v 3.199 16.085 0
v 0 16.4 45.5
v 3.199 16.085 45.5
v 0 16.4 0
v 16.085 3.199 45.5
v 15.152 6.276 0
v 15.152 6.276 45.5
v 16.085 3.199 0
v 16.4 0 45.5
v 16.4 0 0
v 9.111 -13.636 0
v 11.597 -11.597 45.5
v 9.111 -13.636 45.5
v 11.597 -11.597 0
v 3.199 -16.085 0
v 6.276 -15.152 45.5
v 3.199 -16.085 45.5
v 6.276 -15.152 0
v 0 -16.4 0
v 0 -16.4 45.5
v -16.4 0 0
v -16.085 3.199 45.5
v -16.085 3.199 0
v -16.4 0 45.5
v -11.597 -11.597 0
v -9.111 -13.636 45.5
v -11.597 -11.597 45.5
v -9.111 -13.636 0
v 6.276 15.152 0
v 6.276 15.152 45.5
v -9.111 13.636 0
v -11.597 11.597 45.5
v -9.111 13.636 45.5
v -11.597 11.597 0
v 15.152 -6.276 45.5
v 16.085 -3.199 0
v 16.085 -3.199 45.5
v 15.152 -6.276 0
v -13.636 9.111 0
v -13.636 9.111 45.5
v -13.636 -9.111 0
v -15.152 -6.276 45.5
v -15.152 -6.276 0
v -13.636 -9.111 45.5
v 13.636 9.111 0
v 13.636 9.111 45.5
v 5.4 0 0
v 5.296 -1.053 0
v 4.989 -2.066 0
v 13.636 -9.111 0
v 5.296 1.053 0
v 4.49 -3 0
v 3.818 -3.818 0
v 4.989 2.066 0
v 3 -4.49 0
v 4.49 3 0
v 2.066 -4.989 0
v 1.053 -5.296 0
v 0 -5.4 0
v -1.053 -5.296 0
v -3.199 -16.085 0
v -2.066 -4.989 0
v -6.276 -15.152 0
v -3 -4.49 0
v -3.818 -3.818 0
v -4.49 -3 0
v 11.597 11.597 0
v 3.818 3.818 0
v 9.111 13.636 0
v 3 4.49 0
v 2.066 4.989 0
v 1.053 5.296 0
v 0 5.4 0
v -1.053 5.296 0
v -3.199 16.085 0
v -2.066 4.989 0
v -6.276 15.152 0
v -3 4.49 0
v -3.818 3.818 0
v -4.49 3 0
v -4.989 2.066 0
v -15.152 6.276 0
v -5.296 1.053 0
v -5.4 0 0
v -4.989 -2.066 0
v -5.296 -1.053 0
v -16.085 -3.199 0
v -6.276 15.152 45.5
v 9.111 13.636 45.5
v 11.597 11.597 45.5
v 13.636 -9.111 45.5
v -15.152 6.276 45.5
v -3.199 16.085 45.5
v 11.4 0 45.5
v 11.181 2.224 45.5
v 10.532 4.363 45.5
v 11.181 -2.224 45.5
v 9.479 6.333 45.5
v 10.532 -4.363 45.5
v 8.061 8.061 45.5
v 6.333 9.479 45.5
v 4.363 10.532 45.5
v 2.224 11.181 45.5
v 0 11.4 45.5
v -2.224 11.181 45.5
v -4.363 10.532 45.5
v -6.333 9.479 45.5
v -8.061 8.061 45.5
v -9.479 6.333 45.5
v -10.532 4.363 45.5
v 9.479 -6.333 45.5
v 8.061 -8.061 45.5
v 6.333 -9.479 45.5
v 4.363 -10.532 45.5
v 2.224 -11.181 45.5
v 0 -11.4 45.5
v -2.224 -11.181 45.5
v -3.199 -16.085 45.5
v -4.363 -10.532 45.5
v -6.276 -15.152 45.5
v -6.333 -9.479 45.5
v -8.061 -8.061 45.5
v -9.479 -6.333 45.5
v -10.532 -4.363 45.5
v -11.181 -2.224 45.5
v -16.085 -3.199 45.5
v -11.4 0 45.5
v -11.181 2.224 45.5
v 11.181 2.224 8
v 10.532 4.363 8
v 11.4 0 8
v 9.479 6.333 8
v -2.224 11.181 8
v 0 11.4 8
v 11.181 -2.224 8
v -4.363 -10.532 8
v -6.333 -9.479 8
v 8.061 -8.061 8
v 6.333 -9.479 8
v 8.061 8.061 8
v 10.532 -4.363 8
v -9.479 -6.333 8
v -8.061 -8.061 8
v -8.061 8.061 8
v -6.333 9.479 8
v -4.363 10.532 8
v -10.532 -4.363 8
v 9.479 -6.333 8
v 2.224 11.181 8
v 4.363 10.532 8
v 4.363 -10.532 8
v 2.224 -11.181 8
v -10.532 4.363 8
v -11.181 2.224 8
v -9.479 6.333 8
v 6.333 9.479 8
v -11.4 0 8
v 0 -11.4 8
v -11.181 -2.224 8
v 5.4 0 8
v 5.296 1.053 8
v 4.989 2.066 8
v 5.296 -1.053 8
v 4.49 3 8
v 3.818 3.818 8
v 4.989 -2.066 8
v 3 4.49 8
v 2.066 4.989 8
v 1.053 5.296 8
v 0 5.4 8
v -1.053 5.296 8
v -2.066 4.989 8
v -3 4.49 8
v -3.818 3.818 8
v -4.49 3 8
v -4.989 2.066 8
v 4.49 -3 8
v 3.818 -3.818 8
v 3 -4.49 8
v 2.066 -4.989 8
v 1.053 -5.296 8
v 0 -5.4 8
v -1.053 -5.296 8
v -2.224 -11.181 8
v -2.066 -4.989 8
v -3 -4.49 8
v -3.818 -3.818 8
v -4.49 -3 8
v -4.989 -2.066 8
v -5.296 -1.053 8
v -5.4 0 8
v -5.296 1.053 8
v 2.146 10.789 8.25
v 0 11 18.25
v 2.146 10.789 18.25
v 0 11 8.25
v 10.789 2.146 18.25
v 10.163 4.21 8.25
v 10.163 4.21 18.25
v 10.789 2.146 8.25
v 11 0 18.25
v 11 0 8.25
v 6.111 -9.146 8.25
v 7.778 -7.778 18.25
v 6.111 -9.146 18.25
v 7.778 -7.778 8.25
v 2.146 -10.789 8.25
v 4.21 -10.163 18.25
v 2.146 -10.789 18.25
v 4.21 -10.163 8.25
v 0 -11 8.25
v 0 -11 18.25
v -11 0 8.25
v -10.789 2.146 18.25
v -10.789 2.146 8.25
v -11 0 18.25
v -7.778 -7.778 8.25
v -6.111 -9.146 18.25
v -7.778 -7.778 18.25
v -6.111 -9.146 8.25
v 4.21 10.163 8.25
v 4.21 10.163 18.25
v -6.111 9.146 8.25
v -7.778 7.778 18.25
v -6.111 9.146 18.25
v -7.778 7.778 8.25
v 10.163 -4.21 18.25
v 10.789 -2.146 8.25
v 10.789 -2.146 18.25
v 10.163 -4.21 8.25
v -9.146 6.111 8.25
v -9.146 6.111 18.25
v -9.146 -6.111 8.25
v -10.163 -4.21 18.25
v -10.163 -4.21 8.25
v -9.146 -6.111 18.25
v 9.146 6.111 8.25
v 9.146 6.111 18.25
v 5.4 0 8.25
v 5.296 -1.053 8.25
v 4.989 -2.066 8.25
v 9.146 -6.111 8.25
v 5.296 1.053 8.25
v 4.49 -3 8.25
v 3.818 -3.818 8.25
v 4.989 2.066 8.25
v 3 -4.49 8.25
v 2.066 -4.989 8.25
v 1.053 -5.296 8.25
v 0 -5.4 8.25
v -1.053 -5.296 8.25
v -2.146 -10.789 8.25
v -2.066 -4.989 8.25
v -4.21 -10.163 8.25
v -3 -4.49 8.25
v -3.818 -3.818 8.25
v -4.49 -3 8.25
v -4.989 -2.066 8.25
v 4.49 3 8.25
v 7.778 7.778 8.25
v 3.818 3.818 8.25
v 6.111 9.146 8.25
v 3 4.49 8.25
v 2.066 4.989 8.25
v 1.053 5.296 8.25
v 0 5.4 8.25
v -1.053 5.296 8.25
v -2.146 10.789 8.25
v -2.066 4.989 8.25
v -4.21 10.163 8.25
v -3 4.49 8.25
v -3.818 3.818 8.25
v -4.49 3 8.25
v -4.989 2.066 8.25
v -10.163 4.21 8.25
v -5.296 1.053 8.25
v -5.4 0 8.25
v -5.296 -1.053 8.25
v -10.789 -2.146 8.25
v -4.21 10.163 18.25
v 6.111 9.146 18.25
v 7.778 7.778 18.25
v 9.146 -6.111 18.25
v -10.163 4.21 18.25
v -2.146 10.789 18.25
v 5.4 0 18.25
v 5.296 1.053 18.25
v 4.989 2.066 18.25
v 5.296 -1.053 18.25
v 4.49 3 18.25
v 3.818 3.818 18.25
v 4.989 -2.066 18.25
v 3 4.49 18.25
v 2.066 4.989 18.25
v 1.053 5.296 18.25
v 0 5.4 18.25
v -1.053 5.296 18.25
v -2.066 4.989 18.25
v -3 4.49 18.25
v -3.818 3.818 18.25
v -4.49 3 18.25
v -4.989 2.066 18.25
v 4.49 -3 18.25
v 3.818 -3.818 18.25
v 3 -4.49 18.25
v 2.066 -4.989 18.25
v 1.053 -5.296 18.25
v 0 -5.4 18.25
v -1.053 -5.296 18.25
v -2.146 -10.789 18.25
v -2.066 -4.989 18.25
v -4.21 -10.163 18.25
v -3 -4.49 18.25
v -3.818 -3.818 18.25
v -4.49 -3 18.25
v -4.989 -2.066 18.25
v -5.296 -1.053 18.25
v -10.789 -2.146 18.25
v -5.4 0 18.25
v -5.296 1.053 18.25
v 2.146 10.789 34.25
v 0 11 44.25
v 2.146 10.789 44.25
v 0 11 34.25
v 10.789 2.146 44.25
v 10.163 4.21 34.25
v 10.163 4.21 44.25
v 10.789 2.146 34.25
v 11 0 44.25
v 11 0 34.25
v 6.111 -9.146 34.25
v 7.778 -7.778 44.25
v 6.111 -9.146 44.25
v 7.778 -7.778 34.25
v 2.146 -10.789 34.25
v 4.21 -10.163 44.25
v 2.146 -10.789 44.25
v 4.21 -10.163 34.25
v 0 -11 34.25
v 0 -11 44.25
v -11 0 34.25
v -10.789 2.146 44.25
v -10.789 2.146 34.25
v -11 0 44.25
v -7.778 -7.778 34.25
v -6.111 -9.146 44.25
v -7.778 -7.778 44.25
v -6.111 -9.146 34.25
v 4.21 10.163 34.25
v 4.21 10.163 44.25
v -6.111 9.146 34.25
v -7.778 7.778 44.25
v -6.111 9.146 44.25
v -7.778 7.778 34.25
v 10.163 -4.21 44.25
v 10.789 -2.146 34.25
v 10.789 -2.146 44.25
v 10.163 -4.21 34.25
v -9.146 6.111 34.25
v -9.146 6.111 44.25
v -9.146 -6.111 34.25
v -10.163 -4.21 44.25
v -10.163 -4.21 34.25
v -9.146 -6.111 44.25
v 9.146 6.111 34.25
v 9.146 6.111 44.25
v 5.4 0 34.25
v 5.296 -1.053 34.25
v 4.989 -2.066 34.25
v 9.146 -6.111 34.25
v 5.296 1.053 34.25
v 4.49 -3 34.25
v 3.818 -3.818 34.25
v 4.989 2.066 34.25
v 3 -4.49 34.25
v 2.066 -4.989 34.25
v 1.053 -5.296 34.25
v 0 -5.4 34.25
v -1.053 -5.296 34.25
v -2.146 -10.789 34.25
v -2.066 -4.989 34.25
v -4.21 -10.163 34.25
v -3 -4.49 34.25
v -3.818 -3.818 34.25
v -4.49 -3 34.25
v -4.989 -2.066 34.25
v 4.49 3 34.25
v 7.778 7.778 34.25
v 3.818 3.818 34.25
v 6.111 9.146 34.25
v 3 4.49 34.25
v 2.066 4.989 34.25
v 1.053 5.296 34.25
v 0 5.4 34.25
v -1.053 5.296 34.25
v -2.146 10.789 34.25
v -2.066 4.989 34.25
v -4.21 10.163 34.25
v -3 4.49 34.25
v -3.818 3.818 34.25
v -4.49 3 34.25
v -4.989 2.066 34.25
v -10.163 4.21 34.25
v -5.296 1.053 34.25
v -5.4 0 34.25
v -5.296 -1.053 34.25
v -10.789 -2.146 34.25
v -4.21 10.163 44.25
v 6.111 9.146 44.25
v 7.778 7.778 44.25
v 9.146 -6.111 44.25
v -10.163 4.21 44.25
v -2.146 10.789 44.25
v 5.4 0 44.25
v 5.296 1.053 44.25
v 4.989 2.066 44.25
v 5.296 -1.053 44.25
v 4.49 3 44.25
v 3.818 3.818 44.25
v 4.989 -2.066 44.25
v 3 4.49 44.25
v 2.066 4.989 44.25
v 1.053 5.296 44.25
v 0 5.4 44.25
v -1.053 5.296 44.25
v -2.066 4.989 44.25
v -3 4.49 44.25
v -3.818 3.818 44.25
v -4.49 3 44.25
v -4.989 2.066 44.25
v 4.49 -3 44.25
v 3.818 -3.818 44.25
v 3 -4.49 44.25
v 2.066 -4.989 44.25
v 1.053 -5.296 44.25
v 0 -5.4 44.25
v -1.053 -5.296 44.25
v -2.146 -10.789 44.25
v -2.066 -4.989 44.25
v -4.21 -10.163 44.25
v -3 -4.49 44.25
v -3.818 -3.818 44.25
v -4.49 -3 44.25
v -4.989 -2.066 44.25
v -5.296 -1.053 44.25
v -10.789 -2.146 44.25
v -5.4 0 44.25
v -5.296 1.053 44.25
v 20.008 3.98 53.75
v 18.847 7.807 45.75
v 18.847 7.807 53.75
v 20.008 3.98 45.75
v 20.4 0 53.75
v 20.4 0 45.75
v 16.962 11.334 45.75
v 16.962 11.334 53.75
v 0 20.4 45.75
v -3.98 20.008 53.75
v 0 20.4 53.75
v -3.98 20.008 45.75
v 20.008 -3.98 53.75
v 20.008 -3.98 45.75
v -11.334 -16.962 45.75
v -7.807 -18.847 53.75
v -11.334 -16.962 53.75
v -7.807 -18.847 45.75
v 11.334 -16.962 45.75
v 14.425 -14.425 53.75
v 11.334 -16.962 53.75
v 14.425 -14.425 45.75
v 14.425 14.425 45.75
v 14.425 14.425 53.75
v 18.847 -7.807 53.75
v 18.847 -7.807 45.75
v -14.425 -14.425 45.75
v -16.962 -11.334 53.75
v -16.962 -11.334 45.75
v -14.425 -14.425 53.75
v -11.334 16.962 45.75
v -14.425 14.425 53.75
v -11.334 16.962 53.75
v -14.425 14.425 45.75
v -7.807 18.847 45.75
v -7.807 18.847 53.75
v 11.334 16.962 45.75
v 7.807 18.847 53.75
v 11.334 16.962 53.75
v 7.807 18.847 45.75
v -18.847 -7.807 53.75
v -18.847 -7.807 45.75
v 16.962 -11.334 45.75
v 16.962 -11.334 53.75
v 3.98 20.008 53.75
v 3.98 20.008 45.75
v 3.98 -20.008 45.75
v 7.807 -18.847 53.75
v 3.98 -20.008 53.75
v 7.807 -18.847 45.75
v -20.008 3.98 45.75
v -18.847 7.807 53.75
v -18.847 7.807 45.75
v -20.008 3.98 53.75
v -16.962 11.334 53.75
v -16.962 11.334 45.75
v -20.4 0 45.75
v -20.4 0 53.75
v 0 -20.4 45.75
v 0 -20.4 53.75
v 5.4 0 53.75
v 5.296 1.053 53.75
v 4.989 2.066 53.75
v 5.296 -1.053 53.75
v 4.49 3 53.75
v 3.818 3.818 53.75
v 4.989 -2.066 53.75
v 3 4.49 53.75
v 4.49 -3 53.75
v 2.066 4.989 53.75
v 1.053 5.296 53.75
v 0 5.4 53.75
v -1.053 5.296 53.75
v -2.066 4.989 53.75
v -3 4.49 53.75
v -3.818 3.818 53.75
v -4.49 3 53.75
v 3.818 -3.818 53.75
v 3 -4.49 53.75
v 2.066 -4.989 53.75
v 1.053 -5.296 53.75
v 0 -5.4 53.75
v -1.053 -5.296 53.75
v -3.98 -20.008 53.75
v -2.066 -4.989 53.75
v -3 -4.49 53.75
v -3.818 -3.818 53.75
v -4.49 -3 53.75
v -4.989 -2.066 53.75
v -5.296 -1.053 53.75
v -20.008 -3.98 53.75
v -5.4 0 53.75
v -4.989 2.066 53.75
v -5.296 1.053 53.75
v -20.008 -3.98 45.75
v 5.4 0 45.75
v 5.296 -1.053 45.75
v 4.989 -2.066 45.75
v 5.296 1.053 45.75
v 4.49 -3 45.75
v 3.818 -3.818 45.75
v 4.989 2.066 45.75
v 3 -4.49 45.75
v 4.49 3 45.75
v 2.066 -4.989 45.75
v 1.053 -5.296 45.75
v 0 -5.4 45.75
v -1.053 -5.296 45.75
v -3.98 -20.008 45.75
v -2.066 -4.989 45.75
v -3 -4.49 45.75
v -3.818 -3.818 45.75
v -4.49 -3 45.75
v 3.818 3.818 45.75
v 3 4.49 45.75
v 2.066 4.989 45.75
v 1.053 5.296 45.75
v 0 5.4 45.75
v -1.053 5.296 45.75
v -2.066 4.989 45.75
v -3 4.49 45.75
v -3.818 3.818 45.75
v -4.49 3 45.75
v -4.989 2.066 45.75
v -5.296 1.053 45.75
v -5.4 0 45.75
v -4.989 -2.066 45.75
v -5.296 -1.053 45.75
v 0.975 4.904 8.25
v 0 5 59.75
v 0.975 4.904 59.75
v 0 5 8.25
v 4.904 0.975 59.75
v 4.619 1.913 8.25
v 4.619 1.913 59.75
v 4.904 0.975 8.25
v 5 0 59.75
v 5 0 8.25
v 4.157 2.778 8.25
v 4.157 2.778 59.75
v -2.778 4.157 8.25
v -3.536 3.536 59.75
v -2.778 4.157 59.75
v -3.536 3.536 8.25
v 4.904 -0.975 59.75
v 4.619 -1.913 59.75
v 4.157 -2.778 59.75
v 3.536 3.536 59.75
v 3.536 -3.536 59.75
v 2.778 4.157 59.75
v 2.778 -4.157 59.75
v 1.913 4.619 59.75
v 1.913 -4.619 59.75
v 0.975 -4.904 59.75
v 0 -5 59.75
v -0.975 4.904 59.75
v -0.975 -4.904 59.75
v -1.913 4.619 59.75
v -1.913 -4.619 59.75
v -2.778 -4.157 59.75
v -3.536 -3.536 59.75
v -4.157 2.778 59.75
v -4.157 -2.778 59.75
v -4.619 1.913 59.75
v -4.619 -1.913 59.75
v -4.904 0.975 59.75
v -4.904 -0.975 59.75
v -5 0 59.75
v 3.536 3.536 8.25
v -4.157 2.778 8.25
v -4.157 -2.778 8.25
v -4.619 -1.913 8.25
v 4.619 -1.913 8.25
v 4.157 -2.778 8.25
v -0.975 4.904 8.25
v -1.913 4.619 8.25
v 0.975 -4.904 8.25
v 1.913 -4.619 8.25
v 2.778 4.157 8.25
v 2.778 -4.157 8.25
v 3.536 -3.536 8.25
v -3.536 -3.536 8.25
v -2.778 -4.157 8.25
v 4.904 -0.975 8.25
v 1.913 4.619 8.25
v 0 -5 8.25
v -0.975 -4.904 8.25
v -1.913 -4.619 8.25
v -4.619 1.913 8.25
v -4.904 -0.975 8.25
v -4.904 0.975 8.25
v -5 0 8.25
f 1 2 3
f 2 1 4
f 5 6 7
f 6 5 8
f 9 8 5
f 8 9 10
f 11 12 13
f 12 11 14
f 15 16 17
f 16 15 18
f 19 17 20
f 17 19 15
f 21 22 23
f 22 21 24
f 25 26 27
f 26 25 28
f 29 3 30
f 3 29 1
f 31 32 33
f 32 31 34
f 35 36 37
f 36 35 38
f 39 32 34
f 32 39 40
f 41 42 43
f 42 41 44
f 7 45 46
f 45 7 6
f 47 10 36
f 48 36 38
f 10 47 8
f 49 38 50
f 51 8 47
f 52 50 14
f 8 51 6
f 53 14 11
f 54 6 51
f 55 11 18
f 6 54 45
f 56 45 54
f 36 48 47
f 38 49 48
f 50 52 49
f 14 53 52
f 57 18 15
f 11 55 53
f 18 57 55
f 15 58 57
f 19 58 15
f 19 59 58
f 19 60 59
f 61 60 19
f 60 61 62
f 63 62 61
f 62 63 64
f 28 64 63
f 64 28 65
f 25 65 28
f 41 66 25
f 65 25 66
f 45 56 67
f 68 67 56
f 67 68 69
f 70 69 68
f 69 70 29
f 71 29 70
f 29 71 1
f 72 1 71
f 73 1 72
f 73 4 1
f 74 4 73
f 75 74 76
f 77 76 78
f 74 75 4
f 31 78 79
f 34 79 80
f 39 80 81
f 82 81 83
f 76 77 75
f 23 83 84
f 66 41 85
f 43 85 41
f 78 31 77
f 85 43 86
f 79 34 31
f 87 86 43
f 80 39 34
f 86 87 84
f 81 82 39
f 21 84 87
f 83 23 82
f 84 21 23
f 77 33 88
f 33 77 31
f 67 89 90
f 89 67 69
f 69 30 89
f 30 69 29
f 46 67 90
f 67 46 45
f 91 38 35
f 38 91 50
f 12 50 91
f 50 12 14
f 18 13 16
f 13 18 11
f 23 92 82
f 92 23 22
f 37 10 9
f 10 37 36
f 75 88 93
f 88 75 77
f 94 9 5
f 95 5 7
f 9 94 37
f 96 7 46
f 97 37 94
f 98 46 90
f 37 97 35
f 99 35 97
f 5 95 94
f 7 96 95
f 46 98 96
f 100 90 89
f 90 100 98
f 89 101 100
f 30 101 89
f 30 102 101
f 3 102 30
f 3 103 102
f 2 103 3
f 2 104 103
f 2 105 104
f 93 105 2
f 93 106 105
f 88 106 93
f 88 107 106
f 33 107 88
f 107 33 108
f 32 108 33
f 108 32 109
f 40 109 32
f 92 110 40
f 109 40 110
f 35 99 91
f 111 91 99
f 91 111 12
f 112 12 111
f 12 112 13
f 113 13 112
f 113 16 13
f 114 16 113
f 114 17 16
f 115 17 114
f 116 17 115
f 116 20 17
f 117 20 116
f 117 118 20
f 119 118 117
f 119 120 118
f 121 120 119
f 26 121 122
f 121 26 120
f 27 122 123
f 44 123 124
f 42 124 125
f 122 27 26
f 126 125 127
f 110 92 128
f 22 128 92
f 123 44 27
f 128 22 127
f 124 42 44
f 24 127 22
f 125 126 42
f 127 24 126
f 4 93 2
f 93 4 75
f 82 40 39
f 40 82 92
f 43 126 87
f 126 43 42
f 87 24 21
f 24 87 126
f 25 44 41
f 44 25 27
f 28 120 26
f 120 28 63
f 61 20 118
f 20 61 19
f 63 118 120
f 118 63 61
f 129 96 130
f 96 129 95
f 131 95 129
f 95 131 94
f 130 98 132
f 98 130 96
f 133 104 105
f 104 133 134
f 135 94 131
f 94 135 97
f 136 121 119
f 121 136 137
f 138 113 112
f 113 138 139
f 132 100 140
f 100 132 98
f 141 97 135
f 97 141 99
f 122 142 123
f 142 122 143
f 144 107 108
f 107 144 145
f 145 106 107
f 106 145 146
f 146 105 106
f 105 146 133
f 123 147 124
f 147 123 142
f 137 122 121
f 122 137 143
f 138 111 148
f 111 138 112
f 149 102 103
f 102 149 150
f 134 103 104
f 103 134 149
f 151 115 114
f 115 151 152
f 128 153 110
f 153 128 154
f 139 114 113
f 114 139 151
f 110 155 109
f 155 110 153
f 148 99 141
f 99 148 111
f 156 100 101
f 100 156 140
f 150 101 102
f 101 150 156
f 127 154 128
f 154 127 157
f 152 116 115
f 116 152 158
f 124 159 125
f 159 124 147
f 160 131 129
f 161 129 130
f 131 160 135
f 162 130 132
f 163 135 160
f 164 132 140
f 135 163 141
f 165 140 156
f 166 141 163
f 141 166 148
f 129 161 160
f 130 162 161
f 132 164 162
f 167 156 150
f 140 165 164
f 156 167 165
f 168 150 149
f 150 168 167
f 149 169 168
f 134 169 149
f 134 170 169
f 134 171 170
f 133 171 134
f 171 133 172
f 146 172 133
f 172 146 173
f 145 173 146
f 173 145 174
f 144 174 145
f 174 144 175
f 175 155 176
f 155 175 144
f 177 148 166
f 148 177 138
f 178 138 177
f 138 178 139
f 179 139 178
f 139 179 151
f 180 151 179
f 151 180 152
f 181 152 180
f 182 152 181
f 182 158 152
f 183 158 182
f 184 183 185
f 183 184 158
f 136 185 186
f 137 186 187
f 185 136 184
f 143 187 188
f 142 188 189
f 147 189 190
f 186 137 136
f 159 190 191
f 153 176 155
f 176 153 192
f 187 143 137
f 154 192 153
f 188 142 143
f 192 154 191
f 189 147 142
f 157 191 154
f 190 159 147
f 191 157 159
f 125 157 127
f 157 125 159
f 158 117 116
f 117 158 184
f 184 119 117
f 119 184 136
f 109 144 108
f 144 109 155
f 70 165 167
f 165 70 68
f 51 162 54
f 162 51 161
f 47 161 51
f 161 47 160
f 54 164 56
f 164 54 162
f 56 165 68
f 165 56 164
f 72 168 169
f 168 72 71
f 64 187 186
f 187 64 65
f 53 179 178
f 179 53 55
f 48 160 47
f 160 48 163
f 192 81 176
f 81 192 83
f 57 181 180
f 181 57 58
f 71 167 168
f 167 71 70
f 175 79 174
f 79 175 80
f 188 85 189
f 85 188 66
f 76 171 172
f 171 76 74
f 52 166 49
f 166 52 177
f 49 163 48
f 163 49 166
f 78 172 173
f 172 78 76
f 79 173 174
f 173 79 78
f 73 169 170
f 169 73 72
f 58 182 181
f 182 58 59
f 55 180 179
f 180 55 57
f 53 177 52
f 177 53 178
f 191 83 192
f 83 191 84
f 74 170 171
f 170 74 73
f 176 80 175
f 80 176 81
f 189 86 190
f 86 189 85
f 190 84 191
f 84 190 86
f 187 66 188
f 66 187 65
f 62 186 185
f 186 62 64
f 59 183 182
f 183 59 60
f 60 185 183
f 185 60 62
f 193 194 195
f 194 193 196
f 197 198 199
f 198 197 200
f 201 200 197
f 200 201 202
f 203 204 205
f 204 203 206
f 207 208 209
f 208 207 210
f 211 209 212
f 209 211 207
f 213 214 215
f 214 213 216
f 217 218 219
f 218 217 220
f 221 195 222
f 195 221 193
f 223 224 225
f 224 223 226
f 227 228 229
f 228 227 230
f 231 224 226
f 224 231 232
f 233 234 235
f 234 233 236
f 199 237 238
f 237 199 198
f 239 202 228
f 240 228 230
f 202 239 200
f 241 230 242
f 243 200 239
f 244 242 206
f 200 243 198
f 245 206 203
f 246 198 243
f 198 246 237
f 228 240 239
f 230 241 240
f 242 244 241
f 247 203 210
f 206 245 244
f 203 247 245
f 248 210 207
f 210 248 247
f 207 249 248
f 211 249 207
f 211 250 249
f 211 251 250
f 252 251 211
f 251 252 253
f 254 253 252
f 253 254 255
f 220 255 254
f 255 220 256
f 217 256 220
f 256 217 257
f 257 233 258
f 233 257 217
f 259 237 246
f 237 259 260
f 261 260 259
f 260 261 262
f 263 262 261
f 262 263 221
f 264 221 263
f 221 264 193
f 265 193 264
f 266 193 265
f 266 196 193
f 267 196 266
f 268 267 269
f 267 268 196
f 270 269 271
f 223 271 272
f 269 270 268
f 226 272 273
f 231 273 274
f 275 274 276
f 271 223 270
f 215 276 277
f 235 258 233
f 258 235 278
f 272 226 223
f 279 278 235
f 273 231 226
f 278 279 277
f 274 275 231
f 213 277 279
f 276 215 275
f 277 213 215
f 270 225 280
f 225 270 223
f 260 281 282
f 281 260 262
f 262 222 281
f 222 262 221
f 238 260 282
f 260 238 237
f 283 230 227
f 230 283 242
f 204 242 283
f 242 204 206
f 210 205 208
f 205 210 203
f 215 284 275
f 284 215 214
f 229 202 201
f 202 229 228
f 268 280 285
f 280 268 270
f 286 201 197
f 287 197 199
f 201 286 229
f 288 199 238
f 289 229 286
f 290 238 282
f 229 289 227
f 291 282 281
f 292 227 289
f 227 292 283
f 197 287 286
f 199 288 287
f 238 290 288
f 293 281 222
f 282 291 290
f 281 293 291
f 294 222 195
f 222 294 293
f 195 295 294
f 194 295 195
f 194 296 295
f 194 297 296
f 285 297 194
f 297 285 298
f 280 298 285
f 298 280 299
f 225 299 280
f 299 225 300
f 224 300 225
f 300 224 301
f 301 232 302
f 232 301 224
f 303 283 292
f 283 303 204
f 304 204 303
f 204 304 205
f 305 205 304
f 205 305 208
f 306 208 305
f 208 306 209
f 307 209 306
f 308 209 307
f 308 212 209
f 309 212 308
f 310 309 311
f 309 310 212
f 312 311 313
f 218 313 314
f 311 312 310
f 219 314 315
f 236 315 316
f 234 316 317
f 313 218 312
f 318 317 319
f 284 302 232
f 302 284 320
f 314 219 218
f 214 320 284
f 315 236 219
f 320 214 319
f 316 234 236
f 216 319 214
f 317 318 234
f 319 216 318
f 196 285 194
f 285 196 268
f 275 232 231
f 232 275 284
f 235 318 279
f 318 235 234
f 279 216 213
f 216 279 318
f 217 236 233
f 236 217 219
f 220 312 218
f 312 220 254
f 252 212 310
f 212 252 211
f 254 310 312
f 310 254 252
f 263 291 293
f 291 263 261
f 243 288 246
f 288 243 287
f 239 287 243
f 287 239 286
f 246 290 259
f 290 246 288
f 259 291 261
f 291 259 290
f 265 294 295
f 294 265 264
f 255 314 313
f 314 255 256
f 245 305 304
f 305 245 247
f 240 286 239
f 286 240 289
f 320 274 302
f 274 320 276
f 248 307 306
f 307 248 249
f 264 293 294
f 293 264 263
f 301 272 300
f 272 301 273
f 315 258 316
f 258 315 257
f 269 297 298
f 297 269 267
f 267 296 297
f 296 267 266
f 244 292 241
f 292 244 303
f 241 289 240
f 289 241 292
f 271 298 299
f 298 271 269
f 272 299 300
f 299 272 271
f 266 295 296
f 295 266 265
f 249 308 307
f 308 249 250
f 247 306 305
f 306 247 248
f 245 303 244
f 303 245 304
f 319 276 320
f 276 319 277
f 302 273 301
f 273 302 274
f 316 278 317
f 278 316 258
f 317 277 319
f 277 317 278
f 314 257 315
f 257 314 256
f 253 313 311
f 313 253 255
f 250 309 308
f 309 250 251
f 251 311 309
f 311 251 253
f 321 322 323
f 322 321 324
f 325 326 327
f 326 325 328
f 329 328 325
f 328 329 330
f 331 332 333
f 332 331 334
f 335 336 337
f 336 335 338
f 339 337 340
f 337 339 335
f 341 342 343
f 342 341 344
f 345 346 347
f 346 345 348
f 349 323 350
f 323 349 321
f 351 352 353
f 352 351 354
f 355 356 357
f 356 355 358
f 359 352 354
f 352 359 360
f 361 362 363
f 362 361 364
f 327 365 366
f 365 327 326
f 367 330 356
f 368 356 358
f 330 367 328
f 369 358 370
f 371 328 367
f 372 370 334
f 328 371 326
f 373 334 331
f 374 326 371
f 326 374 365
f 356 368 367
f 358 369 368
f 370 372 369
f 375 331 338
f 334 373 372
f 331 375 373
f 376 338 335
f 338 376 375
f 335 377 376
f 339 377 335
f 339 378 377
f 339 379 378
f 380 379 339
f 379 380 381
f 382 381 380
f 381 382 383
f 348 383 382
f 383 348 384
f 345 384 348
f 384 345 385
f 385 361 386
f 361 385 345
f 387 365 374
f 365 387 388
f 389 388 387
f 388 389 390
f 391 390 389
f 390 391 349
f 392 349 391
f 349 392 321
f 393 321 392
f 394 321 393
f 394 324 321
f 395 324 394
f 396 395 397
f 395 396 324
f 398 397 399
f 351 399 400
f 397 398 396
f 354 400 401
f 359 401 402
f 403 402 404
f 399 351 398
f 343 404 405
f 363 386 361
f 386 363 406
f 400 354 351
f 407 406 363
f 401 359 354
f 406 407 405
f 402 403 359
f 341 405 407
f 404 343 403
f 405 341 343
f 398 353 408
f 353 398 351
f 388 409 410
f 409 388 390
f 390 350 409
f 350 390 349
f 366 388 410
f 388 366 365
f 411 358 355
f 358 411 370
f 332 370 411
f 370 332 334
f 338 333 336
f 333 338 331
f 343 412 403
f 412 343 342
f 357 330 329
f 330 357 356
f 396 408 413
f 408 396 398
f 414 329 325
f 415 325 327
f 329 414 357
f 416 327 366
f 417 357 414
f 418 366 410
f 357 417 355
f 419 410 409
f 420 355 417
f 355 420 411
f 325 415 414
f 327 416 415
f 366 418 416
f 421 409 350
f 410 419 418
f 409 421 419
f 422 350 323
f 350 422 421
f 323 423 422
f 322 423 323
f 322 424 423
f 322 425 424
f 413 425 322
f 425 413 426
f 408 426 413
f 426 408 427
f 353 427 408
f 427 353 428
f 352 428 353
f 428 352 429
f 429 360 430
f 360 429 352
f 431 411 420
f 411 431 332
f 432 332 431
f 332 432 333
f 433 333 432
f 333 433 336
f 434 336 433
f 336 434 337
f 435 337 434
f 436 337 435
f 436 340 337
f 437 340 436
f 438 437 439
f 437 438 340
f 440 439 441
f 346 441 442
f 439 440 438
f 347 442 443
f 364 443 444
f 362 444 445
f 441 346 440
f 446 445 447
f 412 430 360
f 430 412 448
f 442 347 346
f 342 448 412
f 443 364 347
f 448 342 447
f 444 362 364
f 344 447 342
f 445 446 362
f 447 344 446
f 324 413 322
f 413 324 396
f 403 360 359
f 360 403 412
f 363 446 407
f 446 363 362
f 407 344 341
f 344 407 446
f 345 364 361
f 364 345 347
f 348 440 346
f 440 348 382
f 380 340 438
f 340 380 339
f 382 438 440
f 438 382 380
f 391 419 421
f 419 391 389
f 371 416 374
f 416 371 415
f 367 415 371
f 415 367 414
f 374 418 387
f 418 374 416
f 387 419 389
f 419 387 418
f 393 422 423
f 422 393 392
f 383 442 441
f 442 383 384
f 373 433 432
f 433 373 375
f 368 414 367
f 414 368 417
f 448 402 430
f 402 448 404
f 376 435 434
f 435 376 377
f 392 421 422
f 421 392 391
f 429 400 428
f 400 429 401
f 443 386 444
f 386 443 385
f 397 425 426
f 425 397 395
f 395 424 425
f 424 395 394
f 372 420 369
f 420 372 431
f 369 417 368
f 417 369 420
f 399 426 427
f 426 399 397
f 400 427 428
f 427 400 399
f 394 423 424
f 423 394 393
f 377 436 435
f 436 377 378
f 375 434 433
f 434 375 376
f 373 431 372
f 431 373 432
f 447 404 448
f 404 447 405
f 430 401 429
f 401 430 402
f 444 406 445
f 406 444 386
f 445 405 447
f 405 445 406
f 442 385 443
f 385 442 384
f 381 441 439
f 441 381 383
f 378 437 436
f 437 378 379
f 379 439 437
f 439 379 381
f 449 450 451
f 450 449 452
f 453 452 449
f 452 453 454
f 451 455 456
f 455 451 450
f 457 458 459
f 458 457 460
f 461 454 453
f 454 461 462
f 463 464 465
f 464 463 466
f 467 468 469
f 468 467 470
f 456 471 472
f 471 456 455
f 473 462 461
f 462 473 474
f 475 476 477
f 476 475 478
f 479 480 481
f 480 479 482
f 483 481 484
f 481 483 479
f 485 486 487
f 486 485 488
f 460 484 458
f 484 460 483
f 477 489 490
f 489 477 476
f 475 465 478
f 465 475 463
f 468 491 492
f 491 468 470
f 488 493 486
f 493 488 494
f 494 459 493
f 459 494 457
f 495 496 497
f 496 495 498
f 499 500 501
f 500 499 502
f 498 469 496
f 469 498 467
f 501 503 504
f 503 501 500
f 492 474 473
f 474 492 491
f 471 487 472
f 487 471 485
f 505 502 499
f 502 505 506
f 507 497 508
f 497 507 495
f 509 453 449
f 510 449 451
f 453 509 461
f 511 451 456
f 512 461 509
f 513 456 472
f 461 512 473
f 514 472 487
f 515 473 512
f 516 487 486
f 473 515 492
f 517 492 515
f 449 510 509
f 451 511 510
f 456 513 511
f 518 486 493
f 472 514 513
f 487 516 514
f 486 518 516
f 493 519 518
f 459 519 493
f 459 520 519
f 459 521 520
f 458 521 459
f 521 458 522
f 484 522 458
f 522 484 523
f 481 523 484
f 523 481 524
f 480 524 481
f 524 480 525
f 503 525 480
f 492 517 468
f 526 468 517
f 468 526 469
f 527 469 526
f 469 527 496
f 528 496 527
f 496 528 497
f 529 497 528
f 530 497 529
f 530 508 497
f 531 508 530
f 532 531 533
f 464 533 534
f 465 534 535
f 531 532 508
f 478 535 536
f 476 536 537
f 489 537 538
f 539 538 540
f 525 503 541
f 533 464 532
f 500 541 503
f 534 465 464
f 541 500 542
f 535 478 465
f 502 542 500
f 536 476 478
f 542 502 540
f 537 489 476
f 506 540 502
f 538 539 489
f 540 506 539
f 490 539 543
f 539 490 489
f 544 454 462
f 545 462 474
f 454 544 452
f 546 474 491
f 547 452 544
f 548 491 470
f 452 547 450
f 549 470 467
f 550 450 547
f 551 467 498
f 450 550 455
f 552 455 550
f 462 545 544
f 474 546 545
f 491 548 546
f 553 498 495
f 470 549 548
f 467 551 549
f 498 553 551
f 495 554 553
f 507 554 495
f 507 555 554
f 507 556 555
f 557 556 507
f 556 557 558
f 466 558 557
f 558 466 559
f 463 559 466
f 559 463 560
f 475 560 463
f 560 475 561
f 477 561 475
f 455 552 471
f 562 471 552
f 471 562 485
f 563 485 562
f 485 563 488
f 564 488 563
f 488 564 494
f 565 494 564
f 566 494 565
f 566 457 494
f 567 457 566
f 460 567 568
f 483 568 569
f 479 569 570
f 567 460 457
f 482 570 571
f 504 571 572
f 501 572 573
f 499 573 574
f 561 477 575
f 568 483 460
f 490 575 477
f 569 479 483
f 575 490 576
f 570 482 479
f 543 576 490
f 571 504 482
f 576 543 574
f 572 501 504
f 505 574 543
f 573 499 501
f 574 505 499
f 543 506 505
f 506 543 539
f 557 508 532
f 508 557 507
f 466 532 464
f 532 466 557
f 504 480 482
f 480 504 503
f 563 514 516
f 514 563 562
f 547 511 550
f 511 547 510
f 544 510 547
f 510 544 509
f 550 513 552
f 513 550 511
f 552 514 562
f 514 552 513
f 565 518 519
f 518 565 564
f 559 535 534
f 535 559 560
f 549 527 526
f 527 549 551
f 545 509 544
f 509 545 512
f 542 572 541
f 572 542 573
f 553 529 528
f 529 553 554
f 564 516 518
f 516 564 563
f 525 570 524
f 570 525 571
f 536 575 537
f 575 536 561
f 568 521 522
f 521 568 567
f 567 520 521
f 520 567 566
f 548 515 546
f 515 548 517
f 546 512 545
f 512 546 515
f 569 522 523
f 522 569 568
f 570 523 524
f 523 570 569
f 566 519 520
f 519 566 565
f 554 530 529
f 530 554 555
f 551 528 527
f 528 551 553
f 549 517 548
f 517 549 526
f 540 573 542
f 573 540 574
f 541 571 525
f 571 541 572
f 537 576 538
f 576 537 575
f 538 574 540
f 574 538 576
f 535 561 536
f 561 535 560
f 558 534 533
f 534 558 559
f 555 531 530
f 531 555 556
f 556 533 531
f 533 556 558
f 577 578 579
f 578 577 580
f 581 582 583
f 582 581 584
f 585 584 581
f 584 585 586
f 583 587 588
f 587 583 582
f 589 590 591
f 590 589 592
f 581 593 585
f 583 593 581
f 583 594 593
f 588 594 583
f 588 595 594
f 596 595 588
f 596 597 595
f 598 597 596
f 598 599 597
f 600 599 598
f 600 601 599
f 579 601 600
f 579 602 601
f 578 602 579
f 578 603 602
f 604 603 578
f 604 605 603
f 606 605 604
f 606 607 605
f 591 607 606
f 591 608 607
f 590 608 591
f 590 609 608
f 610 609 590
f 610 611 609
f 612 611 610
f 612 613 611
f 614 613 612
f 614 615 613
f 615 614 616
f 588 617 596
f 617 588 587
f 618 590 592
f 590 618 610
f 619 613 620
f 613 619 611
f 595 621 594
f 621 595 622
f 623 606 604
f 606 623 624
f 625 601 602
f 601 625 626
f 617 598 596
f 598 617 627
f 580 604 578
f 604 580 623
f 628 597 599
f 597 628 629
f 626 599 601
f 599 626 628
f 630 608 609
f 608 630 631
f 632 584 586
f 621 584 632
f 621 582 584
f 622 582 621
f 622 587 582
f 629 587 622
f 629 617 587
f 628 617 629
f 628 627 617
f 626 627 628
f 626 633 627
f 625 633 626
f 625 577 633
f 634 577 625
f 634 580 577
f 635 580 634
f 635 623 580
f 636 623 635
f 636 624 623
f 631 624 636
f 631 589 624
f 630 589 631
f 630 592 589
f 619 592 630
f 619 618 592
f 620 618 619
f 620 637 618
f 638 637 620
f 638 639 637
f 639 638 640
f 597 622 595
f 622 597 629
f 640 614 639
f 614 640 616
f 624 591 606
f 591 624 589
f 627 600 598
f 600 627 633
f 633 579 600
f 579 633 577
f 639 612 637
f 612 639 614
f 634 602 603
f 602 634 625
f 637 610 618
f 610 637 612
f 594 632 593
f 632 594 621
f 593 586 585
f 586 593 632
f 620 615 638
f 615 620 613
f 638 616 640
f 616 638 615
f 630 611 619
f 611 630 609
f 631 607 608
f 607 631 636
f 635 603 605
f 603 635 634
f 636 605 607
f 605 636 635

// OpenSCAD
$fn = 32;

// ------------------------------------------------------------------------
// Shaft station: cup d32.8 x 45.5 mm, shaft d10
// Every part is its own module, assembly() places every instance.
// ------------------------------------------------------------------------

// --- part 1 ---
module housing_cup() {
  difference() {
    cylinder(h = 45.5, d = 32.8);
    translate([0, 0, 8]) cylinder(h = 38.5, d = 22.8);
    translate([0, 0, -1]) cylinder(h = 10, d = 10.8);
  }
}

// --- part 2 ---
module bearing_lower() {
  difference() {
      translate([0, 0, 0]) cylinder(h = 10, d = 22);
      translate([0, 0, -1]) cylinder(h = 12, d = 10.8);
    }
}

// --- part 3 ---
module bearing_upper() {
  difference() {
      translate([0, 0, 0]) cylinder(h = 10, d = 22);
      translate([0, 0, -1]) cylinder(h = 12, d = 10.8);
    }
}

// --- part 4 ---
module station_shaft() {
  translate([0, 0, -25.75]) cylinder(h = 51.5, d = 10);
}

// --- part 5 ---
module station_cover() {
  difference() {
    cylinder(h = 8, d = 40.8);
    translate([0, 0, -1]) cylinder(h = 10, d = 10.8);
  }
}

// --- assembly ---
module assembly() {
  color([0.80, 0.24, 0.20]) translate([0, 0, 0]) rotate([0, 0, 0]) housing_cup();
  color([0.20, 0.45, 0.75]) translate([0, 0, 8.25]) rotate([0, 0, 0]) bearing_lower();
  color([0.25, 0.62, 0.32]) translate([0, 0, 34.25]) rotate([0, 0, 0]) bearing_upper();
  color([0.92, 0.70, 0.18]) translate([0, 0, 34]) rotate([0, 0, 0]) station_shaft();
  color([0.58, 0.35, 0.70]) translate([0, 0, 45.75]) rotate([0, 0, 0]) station_cover();
}

assembly();
